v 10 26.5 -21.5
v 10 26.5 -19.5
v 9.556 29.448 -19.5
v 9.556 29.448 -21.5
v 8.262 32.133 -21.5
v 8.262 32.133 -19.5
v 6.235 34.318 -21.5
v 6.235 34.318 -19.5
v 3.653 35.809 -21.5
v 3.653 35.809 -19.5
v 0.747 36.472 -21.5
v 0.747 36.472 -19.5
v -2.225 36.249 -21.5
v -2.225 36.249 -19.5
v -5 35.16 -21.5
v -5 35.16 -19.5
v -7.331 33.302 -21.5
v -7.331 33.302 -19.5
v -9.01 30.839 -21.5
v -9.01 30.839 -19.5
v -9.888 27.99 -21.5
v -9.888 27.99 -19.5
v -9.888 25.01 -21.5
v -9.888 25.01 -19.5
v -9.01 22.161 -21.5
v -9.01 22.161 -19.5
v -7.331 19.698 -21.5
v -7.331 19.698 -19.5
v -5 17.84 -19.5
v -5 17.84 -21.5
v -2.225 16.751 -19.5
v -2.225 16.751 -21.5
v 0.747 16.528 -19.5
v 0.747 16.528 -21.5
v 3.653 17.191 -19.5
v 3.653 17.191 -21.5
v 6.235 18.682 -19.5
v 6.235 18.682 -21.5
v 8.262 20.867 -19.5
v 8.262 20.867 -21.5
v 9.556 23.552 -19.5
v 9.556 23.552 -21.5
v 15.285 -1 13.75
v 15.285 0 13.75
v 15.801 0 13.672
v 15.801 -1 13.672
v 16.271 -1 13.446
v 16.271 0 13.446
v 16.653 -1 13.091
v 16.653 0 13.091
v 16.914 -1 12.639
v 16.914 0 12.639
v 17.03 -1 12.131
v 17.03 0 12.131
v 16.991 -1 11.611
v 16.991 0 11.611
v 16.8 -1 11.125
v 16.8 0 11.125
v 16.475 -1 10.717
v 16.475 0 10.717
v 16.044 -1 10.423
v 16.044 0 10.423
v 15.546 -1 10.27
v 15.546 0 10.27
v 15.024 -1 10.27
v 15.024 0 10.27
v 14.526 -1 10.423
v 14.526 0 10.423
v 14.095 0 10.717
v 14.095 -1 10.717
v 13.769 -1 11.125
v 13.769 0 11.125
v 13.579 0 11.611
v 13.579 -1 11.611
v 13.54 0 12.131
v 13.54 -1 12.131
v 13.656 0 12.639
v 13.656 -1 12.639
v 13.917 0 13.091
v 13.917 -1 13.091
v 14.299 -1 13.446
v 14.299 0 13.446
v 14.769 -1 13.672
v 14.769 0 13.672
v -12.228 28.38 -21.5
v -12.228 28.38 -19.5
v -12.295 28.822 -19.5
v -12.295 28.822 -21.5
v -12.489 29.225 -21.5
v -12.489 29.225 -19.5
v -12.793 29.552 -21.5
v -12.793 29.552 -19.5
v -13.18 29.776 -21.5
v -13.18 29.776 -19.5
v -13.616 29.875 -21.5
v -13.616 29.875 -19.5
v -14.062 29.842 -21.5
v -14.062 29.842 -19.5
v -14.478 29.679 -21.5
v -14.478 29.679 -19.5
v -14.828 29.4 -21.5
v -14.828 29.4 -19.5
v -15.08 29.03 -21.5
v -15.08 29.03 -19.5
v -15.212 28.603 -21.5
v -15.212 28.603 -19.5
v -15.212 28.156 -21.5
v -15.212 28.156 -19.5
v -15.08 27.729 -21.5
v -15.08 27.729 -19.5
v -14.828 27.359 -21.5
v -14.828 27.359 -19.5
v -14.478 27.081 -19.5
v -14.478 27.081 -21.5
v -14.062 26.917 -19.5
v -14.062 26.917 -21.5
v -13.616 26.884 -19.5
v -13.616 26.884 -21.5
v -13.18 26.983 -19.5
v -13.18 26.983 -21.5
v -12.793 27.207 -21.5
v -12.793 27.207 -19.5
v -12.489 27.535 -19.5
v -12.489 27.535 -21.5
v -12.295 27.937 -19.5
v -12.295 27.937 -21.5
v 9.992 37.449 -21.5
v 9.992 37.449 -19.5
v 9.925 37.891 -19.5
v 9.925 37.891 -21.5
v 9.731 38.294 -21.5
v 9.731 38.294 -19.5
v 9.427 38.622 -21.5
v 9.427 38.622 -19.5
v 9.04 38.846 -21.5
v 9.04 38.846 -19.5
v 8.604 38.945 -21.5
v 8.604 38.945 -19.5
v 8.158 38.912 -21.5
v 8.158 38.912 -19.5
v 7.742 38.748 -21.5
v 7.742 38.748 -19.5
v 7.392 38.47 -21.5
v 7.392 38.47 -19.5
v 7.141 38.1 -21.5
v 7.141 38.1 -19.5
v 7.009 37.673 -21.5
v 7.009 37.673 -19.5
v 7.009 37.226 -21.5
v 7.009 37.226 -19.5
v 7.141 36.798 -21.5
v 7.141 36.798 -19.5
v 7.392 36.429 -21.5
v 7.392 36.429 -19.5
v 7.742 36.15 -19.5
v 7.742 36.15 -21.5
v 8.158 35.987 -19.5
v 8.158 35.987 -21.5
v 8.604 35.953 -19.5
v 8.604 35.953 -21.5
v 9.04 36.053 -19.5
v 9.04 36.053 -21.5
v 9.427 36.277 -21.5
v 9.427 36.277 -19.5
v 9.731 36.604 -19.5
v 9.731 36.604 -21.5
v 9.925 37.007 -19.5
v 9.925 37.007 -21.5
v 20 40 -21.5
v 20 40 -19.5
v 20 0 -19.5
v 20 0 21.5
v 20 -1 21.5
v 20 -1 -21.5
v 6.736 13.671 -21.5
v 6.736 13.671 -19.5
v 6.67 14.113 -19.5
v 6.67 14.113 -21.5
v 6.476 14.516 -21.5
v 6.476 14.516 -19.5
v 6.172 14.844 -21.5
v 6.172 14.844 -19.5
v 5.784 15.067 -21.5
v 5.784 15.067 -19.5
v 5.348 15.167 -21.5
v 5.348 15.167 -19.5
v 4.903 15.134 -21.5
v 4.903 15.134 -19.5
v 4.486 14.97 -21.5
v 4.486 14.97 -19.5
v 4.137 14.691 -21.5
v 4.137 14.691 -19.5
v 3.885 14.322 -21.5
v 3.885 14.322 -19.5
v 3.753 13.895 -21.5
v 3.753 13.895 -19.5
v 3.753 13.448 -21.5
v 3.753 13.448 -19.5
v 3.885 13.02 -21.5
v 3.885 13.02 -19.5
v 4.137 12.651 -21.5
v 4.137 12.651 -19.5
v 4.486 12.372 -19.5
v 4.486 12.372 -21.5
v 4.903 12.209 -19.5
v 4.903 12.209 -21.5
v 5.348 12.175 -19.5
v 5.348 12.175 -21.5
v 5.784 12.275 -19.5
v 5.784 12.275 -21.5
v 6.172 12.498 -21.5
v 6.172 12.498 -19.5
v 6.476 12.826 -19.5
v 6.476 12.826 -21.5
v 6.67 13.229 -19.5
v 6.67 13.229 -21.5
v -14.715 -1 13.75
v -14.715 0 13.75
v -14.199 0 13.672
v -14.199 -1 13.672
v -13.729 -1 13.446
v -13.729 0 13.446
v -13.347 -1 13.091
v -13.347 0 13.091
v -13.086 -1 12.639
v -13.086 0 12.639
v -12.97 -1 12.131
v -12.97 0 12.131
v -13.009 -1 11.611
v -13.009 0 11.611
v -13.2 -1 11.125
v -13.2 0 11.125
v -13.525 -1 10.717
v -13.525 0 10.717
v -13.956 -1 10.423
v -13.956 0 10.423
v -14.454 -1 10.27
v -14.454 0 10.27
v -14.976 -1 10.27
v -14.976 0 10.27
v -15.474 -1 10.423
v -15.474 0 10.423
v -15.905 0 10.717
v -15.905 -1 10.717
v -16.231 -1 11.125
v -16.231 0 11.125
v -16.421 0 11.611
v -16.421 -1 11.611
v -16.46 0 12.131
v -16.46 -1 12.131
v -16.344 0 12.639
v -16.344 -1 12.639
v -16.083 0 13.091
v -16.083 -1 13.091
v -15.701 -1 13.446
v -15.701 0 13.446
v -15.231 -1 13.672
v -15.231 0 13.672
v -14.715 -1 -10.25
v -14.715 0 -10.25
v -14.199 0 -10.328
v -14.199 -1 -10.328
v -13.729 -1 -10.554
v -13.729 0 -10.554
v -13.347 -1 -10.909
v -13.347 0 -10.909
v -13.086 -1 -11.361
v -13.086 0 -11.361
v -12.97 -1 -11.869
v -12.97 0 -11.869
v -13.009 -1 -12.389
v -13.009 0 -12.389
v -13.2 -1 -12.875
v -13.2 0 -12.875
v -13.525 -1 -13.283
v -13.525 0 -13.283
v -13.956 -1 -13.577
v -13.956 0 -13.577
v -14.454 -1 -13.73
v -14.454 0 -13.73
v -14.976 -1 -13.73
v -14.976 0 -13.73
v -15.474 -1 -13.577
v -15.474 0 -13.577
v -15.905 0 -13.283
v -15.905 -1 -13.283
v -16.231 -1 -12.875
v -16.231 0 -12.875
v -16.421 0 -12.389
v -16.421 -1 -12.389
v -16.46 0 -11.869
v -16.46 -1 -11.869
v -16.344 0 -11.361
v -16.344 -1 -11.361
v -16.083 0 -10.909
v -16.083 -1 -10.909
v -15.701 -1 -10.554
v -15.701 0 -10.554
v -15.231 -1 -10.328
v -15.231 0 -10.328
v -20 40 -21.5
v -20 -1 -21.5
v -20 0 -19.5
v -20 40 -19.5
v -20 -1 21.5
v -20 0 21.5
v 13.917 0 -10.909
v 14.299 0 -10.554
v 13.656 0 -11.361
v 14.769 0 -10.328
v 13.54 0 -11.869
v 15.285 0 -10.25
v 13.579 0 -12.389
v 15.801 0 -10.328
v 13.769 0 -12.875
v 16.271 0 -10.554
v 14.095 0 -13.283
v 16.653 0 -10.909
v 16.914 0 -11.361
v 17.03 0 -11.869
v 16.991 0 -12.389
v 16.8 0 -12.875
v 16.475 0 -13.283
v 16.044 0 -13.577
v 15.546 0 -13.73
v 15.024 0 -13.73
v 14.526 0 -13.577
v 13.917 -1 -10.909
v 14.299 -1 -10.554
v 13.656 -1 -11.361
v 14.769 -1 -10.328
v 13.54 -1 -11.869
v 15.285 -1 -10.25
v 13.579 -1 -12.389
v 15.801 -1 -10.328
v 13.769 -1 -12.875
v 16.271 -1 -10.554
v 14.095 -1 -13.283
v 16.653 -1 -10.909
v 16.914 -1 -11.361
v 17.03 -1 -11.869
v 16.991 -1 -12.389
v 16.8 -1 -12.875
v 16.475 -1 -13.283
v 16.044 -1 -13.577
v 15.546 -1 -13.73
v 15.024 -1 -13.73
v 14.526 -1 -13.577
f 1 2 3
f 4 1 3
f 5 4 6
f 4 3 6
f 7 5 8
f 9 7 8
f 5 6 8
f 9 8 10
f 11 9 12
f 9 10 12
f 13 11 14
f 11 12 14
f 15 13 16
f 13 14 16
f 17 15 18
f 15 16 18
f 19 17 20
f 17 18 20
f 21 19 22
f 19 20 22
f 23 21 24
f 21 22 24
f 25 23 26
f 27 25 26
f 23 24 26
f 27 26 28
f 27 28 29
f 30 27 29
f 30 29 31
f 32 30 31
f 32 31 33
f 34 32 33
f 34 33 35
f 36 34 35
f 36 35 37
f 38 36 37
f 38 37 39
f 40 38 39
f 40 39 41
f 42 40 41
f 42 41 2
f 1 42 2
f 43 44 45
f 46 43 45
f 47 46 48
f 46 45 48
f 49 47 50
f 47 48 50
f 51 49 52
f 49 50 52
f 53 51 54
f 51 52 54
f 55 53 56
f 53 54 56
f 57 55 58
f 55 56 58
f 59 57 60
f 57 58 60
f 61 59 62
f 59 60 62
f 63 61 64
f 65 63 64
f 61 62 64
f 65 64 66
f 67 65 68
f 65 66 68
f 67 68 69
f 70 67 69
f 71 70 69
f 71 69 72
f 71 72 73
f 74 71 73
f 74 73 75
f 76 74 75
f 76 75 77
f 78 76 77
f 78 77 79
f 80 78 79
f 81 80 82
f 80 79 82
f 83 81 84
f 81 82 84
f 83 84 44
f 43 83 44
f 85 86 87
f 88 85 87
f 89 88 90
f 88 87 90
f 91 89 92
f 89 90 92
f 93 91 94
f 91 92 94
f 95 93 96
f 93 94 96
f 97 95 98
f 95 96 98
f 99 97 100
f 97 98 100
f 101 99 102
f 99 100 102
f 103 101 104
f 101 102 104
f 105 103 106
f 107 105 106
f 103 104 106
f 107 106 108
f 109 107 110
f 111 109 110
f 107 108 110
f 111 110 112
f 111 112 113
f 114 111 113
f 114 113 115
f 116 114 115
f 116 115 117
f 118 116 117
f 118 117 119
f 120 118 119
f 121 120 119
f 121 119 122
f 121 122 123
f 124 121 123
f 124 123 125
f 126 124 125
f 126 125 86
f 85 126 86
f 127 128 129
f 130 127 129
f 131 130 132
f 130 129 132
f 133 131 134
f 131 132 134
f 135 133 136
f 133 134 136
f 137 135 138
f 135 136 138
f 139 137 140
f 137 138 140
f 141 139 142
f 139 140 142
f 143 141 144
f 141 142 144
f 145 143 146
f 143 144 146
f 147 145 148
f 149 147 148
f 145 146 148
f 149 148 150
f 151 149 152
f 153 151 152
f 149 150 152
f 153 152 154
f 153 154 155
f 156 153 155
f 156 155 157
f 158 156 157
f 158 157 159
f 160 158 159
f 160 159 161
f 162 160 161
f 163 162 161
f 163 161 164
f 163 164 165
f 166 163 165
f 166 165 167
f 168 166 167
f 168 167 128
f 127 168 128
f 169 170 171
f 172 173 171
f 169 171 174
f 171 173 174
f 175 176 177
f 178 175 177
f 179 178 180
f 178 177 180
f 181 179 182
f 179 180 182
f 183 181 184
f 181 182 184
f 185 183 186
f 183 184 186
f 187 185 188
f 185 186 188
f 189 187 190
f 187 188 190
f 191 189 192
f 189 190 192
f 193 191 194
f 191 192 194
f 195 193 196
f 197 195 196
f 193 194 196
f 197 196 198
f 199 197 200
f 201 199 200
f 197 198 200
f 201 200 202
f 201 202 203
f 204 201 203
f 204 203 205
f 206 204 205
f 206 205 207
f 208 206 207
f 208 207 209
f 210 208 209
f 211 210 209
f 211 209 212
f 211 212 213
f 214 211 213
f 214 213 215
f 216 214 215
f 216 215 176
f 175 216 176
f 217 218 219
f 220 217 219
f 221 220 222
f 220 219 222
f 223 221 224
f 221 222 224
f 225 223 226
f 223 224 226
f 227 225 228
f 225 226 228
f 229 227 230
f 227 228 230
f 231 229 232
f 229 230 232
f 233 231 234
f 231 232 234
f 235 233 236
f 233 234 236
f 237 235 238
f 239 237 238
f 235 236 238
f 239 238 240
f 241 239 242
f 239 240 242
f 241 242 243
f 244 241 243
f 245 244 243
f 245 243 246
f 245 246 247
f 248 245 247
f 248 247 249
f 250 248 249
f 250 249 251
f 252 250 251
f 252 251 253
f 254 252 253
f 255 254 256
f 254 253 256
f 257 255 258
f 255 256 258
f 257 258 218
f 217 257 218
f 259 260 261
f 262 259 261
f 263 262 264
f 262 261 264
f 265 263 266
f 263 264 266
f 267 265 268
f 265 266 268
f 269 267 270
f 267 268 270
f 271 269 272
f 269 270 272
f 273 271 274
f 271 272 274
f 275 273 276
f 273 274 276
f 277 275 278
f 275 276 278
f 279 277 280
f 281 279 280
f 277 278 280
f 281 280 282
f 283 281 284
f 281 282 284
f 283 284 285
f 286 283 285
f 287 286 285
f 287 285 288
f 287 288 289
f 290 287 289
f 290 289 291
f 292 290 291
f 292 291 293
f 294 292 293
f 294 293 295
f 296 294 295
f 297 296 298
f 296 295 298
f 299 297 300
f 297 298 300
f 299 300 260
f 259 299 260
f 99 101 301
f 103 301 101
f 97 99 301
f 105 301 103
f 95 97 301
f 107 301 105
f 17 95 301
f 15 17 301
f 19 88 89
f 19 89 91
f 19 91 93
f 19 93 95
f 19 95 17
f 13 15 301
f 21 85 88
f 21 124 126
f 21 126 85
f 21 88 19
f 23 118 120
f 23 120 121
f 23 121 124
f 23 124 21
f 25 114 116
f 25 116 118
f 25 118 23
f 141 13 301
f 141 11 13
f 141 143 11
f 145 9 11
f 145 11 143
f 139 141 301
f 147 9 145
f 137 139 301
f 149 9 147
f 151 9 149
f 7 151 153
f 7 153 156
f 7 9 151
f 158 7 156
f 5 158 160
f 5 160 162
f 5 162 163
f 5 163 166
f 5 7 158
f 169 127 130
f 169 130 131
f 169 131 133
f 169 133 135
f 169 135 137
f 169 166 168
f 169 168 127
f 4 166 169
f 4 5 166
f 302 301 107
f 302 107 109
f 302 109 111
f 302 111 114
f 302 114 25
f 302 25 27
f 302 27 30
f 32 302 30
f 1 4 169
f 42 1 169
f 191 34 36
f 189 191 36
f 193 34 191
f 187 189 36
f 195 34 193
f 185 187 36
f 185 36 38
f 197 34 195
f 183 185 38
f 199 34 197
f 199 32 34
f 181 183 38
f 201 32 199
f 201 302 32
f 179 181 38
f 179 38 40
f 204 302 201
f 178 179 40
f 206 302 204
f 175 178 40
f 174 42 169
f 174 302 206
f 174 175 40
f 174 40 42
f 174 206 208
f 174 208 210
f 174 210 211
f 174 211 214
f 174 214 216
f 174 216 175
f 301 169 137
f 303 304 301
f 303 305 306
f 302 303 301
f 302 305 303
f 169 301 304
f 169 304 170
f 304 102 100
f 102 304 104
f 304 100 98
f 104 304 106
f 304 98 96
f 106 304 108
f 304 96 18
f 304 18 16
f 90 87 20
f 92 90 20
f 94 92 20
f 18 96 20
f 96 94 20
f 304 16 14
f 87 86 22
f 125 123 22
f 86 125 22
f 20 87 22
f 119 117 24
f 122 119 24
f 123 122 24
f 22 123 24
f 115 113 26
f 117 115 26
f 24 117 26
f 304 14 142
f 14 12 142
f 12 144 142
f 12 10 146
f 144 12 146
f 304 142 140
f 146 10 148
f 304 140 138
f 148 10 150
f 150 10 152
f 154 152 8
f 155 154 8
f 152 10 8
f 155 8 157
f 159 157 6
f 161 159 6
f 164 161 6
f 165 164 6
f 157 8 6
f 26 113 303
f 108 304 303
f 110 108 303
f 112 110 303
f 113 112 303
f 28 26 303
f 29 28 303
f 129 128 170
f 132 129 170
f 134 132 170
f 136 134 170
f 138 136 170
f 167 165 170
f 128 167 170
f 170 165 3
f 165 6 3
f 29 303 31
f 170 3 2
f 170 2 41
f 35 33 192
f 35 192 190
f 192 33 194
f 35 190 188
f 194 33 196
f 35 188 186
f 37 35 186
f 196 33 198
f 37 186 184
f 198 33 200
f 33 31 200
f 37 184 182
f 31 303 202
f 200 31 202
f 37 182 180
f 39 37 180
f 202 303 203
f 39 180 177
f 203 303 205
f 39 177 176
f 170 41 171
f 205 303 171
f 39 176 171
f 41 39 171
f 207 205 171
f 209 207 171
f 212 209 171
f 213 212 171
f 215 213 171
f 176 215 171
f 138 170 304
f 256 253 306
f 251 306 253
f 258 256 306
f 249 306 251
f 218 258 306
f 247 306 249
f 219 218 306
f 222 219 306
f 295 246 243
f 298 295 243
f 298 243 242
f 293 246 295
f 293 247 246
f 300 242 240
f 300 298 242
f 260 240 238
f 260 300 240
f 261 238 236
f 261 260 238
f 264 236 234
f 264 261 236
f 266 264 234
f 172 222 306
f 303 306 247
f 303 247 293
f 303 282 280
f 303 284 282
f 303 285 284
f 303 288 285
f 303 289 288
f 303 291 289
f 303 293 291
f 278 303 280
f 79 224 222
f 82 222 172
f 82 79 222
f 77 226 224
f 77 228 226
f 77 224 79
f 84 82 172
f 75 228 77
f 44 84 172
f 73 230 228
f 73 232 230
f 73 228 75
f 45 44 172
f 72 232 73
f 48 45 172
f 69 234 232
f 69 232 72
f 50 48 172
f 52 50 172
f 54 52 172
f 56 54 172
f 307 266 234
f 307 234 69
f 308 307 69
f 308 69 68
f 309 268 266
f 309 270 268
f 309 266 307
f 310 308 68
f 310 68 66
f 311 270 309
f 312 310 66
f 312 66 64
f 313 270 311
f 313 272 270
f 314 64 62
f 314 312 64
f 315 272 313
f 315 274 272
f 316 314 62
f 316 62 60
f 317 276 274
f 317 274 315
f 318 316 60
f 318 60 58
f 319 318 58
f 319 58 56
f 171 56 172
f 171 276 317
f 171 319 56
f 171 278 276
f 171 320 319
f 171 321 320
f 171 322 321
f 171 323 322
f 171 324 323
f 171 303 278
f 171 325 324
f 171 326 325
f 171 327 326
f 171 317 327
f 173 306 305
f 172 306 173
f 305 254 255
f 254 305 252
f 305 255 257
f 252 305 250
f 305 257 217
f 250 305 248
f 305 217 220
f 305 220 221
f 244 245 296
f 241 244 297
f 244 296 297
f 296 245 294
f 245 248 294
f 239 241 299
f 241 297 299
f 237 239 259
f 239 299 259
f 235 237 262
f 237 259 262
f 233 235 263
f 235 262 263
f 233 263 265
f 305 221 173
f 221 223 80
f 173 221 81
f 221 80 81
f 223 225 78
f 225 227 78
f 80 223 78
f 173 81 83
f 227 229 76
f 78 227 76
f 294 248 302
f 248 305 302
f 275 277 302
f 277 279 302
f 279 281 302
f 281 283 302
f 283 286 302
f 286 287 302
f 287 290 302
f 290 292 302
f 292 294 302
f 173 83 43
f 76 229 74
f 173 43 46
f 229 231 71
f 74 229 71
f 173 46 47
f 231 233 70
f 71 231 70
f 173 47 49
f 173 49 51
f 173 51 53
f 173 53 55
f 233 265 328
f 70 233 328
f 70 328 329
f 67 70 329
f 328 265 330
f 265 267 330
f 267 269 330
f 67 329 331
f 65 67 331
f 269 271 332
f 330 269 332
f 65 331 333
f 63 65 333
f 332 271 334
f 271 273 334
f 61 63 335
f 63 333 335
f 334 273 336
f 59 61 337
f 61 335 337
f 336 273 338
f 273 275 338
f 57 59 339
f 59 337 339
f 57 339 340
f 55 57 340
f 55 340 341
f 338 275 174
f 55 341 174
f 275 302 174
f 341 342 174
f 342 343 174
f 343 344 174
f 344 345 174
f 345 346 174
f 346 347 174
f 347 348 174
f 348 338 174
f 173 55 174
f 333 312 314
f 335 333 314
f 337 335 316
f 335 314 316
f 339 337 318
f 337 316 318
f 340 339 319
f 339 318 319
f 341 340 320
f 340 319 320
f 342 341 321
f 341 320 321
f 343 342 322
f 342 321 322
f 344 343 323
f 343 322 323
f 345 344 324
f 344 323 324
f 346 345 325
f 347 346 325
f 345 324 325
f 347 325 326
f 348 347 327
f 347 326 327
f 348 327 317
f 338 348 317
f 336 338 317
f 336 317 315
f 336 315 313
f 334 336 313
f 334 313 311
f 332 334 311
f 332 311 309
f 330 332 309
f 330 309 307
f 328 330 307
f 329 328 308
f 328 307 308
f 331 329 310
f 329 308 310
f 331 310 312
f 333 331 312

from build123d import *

# Parameters (mm, degrees)
SKETCH1_W           = 40
SKETCH1_H           = 43
SKETCH1_R           = 1.75
BOSS_EXTRUDE1_DEPTH = 1
SKETCH4_W           = 40
SKETCH4_H           = 2
BOSS_EXTRUDE2_DEPTH = 40
SKETCH5_R           = 1.5
SKETCH5_R_2         = 10
CUT_EXTRUDE1_DEPTH  = 24


with BuildPart() as part:
    # Sketch1 → Boss-Extrude1 (new body)
    with BuildSketch(Plane(origin=(0, 0, 0), x_dir=(1, 0, 0), z_dir=(0, 1, 0))):
        Rectangle(SKETCH1_W, SKETCH1_H)
        with Locations(Location((-14.715053003, 12, 0), (0, 0, 270))):
            Circle(SKETCH1_R, mode=Mode.SUBTRACT)
        with Locations(Location((15.284946997, 12, 0), (0, 0, 270))):
            Circle(SKETCH1_R, mode=Mode.SUBTRACT)
        with Locations(Location((-14.715053003, -12, 0), (0, 0, 270))):
            Circle(SKETCH1_R, mode=Mode.SUBTRACT)
        with Locations(Location((15.284946997, -12, 0), (0, 0, 270))):
            Circle(SKETCH1_R, mode=Mode.SUBTRACT)
    extrude(amount=-BOSS_EXTRUDE1_DEPTH)

    # Sketch4 → Boss-Extrude2 (add)
    with BuildSketch(Plane(origin=(0, 0, 0), x_dir=(1, 0, 0), z_dir=(0, 1, 0))):
        with Locations((0, 20.5)):
            Rectangle(SKETCH4_W, SKETCH4_H)
    extrude(amount=BOSS_EXTRUDE2_DEPTH)

    # Sketch5 → Cut-Extrude1 (cut)
    with BuildSketch(Plane.XY.offset(-19.5)):
        with Locations((8.491960292, 37.449274423)):
            Circle(SKETCH5_R)
        with Locations((-13.72832995, 28.379616129)):
            Circle(SKETCH5_R)
        with Locations((5.236369657, 13.671109447)):
            Circle(SKETCH5_R)
        with Locations((0, 26.5)):
            Circle(SKETCH5_R_2)
    extrude(amount=-CUT_EXTRUDE1_DEPTH, mode=Mode.SUBTRACT)


solid = part.part
